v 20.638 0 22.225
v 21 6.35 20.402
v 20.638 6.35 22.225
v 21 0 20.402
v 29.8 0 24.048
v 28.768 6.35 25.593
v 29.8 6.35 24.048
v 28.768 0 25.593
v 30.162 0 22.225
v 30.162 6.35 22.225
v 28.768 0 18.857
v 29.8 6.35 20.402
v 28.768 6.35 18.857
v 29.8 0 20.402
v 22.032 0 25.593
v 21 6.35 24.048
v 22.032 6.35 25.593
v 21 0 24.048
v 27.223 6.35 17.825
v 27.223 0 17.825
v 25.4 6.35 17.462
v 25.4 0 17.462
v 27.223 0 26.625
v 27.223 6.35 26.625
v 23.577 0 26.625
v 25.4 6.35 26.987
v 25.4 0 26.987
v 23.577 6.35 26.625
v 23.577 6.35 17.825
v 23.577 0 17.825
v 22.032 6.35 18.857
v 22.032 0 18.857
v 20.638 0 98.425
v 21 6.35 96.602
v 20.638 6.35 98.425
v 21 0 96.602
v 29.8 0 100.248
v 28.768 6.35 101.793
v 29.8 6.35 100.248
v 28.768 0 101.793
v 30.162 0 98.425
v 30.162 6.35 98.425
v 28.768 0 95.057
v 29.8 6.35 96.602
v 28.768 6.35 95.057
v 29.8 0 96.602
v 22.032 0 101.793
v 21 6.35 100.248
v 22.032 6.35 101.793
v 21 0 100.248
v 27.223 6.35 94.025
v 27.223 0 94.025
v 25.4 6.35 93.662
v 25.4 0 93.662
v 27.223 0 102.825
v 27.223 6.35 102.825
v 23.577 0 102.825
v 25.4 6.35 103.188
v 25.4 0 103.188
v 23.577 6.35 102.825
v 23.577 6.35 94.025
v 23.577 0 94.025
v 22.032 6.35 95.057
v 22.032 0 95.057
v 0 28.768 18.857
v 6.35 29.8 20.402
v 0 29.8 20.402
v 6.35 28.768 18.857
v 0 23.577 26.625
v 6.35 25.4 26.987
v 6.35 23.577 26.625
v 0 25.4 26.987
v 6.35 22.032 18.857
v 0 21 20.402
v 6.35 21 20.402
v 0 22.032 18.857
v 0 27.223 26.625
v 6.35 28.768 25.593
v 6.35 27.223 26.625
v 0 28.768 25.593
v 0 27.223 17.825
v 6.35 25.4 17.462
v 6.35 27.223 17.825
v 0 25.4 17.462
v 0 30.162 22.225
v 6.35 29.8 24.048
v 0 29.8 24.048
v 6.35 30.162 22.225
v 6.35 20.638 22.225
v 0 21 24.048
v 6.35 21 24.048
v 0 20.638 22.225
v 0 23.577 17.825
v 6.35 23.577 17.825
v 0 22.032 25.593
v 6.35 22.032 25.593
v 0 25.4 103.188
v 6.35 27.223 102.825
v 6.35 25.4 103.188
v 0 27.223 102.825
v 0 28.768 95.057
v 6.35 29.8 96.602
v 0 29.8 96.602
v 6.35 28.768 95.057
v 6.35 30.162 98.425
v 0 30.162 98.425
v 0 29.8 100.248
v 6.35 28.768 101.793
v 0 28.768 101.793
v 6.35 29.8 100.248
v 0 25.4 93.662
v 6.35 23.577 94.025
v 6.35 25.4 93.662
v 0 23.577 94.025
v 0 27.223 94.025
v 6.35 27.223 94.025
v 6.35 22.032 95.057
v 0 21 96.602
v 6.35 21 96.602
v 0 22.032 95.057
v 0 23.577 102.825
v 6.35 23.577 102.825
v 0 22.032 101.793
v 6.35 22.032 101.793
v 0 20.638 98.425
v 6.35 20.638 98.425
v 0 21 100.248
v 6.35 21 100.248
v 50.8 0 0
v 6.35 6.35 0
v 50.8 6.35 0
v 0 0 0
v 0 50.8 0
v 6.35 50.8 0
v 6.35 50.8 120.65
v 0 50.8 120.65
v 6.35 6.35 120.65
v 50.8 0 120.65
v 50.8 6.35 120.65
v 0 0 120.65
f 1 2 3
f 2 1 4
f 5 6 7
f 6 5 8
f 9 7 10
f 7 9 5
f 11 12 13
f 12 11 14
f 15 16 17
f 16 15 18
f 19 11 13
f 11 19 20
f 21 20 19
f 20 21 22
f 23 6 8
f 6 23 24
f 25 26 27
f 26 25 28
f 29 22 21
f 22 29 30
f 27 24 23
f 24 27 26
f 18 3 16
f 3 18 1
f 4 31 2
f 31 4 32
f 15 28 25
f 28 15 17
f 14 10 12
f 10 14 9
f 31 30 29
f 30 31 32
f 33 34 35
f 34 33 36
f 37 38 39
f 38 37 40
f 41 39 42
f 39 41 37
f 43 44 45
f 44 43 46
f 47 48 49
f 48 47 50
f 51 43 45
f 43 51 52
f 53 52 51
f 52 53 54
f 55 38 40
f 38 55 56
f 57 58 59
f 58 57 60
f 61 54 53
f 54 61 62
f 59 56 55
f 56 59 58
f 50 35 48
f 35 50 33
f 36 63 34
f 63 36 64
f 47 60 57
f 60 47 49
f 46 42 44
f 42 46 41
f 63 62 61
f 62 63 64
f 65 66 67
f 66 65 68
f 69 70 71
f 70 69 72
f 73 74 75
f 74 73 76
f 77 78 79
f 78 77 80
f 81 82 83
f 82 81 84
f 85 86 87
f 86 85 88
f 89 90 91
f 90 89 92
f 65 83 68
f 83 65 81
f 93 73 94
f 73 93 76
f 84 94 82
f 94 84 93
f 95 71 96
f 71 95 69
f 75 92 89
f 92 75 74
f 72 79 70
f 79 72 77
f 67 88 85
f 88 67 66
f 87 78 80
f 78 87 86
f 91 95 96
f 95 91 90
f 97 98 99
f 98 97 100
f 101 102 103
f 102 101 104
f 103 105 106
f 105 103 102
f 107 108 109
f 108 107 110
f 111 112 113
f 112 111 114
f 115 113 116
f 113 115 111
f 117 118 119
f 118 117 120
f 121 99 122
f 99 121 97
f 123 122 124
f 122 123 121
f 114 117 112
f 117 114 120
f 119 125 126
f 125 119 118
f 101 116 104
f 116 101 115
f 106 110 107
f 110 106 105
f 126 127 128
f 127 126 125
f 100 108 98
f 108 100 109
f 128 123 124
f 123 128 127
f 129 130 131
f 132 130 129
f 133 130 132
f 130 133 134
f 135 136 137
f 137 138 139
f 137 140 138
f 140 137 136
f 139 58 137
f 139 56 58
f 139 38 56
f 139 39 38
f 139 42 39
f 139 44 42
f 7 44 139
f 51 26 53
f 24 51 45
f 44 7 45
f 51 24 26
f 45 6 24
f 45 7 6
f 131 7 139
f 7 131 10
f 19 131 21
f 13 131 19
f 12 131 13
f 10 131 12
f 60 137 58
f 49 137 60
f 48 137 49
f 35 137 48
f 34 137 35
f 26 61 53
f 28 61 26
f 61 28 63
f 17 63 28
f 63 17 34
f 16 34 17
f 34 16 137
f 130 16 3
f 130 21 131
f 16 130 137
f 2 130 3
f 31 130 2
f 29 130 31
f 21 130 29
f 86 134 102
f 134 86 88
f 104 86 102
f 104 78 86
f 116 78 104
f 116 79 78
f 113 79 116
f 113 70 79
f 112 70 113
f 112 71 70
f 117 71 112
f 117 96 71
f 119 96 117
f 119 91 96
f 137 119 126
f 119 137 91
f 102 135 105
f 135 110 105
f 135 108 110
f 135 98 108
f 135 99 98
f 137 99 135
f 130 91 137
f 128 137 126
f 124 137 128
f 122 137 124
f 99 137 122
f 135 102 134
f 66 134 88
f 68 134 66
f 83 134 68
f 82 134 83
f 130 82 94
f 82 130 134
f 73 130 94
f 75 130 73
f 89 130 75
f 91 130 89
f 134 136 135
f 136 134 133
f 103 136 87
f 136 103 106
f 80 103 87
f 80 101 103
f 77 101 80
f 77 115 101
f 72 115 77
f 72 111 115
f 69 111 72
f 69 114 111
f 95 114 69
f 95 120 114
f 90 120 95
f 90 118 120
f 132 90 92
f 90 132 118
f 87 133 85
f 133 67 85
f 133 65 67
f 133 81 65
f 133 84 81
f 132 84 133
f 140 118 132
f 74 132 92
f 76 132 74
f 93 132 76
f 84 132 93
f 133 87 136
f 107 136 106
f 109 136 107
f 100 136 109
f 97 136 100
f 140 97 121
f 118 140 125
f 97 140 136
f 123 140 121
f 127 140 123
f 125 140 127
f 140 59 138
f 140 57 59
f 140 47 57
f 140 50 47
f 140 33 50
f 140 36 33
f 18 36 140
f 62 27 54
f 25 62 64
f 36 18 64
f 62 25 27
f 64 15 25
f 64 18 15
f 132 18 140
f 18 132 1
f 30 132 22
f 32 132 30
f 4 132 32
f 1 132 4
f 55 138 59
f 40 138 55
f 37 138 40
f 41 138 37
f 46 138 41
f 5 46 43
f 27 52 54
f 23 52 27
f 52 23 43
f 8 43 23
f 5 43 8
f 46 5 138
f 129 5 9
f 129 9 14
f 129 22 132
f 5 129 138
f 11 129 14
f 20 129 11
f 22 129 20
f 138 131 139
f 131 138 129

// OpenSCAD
// Part A3: Front Stiffener - Outer Section Vertical Angle Iron
// Material: 2"×2"×1/4" Angle Iron (50.8mm × 6.35mm)
// Quantity: 6 pieces (outer walls + inner wall faces)
// Location: Front stiffener plate outer sections (5" tall sections)
//
// These are shorter angle irons used in the 5" tall outer sections of the front stiffener plate.

include <../../lifetrac_v25_params.scad>

// =============================================================================
// PART DIMENSIONS
// =============================================================================

// Front stiffener outer section is 5" (127mm) tall
_outer_height = 127.0;
_angle_trim = 3.175;  // 1/8" trimmed from each end

PART_A3_HEIGHT = _outer_height - 2 * _angle_trim;  // ~120.65mm (4.75")
PART_A3_LEG = 50.8;
PART_A3_THICK = 6.35;
PART_A3_BOLT_DIA = 9.525;  // 3/8" bolts for outer sections
PART_A3_HOLE_OFFSET = PART_A3_LEG / 2;  // Center of leg

// 2 holes spaced 3" (76.2mm) apart, centered on angle
_bolt_spacing = 38.1;  // 1.5" from center (3" total)
PART_A3_HOLES_LEG_A = [PART_A3_HEIGHT/2 - _bolt_spacing, PART_A3_HEIGHT/2 + _bolt_spacing];
PART_A3_HOLES_LEG_B = [PART_A3_HEIGHT/2 - _bolt_spacing, PART_A3_HEIGHT/2 + _bolt_spacing];

// =============================================================================
// MAIN MODULE
// =============================================================================

/**
 * Part A3: Front Stiffener Outer Section Vertical Angle Iron
 * Shorter angle for 5" tall outer sections of front stiffener plate
 */
module _part_a3_front_outer_vertical(show_holes=true) {
    height = PART_A3_HEIGHT;
    leg = PART_A3_LEG;
    thick = PART_A3_THICK;
    bolt_dia = PART_A3_BOLT_DIA;
    hole_offset = PART_A3_HOLE_OFFSET;
    
    color("DarkGray")
    difference() {
        linear_extrude(height=height)
        polygon([
            [0, 0],
            [leg, 0],
            [leg, thick],
            [thick, thick],
            [thick, leg],
            [0, leg]
        ]);
        
        if (show_holes) {
            // Holes on Leg A
            for (z = PART_A3_HOLES_LEG_A) {
                translate([hole_offset, 0, z])
                rotate([90, 0, 0])
                cylinder(d=bolt_dia, h=40, center=true, $fn=16);
            }
            
            // Holes on Leg B
            for (z = PART_A3_HOLES_LEG_B) {
                translate([0, hole_offset, z])
                rotate([0, 90, 0])
                cylinder(d=bolt_dia, h=40, center=true, $fn=16);
            }
        }
    }
}

// =============================================================================
// RENDER
// =============================================================================

_part_a3_front_outer_vertical(show_holes=true);

echo("=== PART A3: Front Stiffener Outer Section Vertical ===");
echo("Height:", PART_A3_HEIGHT, "mm (", PART_A3_HEIGHT/25.4, "inches)");
echo("Bolt diameter:", PART_A3_BOLT_DIA, "mm (3/8\")");
echo("Holes per leg: 2");
echo("Quantity needed: 6 pieces");
